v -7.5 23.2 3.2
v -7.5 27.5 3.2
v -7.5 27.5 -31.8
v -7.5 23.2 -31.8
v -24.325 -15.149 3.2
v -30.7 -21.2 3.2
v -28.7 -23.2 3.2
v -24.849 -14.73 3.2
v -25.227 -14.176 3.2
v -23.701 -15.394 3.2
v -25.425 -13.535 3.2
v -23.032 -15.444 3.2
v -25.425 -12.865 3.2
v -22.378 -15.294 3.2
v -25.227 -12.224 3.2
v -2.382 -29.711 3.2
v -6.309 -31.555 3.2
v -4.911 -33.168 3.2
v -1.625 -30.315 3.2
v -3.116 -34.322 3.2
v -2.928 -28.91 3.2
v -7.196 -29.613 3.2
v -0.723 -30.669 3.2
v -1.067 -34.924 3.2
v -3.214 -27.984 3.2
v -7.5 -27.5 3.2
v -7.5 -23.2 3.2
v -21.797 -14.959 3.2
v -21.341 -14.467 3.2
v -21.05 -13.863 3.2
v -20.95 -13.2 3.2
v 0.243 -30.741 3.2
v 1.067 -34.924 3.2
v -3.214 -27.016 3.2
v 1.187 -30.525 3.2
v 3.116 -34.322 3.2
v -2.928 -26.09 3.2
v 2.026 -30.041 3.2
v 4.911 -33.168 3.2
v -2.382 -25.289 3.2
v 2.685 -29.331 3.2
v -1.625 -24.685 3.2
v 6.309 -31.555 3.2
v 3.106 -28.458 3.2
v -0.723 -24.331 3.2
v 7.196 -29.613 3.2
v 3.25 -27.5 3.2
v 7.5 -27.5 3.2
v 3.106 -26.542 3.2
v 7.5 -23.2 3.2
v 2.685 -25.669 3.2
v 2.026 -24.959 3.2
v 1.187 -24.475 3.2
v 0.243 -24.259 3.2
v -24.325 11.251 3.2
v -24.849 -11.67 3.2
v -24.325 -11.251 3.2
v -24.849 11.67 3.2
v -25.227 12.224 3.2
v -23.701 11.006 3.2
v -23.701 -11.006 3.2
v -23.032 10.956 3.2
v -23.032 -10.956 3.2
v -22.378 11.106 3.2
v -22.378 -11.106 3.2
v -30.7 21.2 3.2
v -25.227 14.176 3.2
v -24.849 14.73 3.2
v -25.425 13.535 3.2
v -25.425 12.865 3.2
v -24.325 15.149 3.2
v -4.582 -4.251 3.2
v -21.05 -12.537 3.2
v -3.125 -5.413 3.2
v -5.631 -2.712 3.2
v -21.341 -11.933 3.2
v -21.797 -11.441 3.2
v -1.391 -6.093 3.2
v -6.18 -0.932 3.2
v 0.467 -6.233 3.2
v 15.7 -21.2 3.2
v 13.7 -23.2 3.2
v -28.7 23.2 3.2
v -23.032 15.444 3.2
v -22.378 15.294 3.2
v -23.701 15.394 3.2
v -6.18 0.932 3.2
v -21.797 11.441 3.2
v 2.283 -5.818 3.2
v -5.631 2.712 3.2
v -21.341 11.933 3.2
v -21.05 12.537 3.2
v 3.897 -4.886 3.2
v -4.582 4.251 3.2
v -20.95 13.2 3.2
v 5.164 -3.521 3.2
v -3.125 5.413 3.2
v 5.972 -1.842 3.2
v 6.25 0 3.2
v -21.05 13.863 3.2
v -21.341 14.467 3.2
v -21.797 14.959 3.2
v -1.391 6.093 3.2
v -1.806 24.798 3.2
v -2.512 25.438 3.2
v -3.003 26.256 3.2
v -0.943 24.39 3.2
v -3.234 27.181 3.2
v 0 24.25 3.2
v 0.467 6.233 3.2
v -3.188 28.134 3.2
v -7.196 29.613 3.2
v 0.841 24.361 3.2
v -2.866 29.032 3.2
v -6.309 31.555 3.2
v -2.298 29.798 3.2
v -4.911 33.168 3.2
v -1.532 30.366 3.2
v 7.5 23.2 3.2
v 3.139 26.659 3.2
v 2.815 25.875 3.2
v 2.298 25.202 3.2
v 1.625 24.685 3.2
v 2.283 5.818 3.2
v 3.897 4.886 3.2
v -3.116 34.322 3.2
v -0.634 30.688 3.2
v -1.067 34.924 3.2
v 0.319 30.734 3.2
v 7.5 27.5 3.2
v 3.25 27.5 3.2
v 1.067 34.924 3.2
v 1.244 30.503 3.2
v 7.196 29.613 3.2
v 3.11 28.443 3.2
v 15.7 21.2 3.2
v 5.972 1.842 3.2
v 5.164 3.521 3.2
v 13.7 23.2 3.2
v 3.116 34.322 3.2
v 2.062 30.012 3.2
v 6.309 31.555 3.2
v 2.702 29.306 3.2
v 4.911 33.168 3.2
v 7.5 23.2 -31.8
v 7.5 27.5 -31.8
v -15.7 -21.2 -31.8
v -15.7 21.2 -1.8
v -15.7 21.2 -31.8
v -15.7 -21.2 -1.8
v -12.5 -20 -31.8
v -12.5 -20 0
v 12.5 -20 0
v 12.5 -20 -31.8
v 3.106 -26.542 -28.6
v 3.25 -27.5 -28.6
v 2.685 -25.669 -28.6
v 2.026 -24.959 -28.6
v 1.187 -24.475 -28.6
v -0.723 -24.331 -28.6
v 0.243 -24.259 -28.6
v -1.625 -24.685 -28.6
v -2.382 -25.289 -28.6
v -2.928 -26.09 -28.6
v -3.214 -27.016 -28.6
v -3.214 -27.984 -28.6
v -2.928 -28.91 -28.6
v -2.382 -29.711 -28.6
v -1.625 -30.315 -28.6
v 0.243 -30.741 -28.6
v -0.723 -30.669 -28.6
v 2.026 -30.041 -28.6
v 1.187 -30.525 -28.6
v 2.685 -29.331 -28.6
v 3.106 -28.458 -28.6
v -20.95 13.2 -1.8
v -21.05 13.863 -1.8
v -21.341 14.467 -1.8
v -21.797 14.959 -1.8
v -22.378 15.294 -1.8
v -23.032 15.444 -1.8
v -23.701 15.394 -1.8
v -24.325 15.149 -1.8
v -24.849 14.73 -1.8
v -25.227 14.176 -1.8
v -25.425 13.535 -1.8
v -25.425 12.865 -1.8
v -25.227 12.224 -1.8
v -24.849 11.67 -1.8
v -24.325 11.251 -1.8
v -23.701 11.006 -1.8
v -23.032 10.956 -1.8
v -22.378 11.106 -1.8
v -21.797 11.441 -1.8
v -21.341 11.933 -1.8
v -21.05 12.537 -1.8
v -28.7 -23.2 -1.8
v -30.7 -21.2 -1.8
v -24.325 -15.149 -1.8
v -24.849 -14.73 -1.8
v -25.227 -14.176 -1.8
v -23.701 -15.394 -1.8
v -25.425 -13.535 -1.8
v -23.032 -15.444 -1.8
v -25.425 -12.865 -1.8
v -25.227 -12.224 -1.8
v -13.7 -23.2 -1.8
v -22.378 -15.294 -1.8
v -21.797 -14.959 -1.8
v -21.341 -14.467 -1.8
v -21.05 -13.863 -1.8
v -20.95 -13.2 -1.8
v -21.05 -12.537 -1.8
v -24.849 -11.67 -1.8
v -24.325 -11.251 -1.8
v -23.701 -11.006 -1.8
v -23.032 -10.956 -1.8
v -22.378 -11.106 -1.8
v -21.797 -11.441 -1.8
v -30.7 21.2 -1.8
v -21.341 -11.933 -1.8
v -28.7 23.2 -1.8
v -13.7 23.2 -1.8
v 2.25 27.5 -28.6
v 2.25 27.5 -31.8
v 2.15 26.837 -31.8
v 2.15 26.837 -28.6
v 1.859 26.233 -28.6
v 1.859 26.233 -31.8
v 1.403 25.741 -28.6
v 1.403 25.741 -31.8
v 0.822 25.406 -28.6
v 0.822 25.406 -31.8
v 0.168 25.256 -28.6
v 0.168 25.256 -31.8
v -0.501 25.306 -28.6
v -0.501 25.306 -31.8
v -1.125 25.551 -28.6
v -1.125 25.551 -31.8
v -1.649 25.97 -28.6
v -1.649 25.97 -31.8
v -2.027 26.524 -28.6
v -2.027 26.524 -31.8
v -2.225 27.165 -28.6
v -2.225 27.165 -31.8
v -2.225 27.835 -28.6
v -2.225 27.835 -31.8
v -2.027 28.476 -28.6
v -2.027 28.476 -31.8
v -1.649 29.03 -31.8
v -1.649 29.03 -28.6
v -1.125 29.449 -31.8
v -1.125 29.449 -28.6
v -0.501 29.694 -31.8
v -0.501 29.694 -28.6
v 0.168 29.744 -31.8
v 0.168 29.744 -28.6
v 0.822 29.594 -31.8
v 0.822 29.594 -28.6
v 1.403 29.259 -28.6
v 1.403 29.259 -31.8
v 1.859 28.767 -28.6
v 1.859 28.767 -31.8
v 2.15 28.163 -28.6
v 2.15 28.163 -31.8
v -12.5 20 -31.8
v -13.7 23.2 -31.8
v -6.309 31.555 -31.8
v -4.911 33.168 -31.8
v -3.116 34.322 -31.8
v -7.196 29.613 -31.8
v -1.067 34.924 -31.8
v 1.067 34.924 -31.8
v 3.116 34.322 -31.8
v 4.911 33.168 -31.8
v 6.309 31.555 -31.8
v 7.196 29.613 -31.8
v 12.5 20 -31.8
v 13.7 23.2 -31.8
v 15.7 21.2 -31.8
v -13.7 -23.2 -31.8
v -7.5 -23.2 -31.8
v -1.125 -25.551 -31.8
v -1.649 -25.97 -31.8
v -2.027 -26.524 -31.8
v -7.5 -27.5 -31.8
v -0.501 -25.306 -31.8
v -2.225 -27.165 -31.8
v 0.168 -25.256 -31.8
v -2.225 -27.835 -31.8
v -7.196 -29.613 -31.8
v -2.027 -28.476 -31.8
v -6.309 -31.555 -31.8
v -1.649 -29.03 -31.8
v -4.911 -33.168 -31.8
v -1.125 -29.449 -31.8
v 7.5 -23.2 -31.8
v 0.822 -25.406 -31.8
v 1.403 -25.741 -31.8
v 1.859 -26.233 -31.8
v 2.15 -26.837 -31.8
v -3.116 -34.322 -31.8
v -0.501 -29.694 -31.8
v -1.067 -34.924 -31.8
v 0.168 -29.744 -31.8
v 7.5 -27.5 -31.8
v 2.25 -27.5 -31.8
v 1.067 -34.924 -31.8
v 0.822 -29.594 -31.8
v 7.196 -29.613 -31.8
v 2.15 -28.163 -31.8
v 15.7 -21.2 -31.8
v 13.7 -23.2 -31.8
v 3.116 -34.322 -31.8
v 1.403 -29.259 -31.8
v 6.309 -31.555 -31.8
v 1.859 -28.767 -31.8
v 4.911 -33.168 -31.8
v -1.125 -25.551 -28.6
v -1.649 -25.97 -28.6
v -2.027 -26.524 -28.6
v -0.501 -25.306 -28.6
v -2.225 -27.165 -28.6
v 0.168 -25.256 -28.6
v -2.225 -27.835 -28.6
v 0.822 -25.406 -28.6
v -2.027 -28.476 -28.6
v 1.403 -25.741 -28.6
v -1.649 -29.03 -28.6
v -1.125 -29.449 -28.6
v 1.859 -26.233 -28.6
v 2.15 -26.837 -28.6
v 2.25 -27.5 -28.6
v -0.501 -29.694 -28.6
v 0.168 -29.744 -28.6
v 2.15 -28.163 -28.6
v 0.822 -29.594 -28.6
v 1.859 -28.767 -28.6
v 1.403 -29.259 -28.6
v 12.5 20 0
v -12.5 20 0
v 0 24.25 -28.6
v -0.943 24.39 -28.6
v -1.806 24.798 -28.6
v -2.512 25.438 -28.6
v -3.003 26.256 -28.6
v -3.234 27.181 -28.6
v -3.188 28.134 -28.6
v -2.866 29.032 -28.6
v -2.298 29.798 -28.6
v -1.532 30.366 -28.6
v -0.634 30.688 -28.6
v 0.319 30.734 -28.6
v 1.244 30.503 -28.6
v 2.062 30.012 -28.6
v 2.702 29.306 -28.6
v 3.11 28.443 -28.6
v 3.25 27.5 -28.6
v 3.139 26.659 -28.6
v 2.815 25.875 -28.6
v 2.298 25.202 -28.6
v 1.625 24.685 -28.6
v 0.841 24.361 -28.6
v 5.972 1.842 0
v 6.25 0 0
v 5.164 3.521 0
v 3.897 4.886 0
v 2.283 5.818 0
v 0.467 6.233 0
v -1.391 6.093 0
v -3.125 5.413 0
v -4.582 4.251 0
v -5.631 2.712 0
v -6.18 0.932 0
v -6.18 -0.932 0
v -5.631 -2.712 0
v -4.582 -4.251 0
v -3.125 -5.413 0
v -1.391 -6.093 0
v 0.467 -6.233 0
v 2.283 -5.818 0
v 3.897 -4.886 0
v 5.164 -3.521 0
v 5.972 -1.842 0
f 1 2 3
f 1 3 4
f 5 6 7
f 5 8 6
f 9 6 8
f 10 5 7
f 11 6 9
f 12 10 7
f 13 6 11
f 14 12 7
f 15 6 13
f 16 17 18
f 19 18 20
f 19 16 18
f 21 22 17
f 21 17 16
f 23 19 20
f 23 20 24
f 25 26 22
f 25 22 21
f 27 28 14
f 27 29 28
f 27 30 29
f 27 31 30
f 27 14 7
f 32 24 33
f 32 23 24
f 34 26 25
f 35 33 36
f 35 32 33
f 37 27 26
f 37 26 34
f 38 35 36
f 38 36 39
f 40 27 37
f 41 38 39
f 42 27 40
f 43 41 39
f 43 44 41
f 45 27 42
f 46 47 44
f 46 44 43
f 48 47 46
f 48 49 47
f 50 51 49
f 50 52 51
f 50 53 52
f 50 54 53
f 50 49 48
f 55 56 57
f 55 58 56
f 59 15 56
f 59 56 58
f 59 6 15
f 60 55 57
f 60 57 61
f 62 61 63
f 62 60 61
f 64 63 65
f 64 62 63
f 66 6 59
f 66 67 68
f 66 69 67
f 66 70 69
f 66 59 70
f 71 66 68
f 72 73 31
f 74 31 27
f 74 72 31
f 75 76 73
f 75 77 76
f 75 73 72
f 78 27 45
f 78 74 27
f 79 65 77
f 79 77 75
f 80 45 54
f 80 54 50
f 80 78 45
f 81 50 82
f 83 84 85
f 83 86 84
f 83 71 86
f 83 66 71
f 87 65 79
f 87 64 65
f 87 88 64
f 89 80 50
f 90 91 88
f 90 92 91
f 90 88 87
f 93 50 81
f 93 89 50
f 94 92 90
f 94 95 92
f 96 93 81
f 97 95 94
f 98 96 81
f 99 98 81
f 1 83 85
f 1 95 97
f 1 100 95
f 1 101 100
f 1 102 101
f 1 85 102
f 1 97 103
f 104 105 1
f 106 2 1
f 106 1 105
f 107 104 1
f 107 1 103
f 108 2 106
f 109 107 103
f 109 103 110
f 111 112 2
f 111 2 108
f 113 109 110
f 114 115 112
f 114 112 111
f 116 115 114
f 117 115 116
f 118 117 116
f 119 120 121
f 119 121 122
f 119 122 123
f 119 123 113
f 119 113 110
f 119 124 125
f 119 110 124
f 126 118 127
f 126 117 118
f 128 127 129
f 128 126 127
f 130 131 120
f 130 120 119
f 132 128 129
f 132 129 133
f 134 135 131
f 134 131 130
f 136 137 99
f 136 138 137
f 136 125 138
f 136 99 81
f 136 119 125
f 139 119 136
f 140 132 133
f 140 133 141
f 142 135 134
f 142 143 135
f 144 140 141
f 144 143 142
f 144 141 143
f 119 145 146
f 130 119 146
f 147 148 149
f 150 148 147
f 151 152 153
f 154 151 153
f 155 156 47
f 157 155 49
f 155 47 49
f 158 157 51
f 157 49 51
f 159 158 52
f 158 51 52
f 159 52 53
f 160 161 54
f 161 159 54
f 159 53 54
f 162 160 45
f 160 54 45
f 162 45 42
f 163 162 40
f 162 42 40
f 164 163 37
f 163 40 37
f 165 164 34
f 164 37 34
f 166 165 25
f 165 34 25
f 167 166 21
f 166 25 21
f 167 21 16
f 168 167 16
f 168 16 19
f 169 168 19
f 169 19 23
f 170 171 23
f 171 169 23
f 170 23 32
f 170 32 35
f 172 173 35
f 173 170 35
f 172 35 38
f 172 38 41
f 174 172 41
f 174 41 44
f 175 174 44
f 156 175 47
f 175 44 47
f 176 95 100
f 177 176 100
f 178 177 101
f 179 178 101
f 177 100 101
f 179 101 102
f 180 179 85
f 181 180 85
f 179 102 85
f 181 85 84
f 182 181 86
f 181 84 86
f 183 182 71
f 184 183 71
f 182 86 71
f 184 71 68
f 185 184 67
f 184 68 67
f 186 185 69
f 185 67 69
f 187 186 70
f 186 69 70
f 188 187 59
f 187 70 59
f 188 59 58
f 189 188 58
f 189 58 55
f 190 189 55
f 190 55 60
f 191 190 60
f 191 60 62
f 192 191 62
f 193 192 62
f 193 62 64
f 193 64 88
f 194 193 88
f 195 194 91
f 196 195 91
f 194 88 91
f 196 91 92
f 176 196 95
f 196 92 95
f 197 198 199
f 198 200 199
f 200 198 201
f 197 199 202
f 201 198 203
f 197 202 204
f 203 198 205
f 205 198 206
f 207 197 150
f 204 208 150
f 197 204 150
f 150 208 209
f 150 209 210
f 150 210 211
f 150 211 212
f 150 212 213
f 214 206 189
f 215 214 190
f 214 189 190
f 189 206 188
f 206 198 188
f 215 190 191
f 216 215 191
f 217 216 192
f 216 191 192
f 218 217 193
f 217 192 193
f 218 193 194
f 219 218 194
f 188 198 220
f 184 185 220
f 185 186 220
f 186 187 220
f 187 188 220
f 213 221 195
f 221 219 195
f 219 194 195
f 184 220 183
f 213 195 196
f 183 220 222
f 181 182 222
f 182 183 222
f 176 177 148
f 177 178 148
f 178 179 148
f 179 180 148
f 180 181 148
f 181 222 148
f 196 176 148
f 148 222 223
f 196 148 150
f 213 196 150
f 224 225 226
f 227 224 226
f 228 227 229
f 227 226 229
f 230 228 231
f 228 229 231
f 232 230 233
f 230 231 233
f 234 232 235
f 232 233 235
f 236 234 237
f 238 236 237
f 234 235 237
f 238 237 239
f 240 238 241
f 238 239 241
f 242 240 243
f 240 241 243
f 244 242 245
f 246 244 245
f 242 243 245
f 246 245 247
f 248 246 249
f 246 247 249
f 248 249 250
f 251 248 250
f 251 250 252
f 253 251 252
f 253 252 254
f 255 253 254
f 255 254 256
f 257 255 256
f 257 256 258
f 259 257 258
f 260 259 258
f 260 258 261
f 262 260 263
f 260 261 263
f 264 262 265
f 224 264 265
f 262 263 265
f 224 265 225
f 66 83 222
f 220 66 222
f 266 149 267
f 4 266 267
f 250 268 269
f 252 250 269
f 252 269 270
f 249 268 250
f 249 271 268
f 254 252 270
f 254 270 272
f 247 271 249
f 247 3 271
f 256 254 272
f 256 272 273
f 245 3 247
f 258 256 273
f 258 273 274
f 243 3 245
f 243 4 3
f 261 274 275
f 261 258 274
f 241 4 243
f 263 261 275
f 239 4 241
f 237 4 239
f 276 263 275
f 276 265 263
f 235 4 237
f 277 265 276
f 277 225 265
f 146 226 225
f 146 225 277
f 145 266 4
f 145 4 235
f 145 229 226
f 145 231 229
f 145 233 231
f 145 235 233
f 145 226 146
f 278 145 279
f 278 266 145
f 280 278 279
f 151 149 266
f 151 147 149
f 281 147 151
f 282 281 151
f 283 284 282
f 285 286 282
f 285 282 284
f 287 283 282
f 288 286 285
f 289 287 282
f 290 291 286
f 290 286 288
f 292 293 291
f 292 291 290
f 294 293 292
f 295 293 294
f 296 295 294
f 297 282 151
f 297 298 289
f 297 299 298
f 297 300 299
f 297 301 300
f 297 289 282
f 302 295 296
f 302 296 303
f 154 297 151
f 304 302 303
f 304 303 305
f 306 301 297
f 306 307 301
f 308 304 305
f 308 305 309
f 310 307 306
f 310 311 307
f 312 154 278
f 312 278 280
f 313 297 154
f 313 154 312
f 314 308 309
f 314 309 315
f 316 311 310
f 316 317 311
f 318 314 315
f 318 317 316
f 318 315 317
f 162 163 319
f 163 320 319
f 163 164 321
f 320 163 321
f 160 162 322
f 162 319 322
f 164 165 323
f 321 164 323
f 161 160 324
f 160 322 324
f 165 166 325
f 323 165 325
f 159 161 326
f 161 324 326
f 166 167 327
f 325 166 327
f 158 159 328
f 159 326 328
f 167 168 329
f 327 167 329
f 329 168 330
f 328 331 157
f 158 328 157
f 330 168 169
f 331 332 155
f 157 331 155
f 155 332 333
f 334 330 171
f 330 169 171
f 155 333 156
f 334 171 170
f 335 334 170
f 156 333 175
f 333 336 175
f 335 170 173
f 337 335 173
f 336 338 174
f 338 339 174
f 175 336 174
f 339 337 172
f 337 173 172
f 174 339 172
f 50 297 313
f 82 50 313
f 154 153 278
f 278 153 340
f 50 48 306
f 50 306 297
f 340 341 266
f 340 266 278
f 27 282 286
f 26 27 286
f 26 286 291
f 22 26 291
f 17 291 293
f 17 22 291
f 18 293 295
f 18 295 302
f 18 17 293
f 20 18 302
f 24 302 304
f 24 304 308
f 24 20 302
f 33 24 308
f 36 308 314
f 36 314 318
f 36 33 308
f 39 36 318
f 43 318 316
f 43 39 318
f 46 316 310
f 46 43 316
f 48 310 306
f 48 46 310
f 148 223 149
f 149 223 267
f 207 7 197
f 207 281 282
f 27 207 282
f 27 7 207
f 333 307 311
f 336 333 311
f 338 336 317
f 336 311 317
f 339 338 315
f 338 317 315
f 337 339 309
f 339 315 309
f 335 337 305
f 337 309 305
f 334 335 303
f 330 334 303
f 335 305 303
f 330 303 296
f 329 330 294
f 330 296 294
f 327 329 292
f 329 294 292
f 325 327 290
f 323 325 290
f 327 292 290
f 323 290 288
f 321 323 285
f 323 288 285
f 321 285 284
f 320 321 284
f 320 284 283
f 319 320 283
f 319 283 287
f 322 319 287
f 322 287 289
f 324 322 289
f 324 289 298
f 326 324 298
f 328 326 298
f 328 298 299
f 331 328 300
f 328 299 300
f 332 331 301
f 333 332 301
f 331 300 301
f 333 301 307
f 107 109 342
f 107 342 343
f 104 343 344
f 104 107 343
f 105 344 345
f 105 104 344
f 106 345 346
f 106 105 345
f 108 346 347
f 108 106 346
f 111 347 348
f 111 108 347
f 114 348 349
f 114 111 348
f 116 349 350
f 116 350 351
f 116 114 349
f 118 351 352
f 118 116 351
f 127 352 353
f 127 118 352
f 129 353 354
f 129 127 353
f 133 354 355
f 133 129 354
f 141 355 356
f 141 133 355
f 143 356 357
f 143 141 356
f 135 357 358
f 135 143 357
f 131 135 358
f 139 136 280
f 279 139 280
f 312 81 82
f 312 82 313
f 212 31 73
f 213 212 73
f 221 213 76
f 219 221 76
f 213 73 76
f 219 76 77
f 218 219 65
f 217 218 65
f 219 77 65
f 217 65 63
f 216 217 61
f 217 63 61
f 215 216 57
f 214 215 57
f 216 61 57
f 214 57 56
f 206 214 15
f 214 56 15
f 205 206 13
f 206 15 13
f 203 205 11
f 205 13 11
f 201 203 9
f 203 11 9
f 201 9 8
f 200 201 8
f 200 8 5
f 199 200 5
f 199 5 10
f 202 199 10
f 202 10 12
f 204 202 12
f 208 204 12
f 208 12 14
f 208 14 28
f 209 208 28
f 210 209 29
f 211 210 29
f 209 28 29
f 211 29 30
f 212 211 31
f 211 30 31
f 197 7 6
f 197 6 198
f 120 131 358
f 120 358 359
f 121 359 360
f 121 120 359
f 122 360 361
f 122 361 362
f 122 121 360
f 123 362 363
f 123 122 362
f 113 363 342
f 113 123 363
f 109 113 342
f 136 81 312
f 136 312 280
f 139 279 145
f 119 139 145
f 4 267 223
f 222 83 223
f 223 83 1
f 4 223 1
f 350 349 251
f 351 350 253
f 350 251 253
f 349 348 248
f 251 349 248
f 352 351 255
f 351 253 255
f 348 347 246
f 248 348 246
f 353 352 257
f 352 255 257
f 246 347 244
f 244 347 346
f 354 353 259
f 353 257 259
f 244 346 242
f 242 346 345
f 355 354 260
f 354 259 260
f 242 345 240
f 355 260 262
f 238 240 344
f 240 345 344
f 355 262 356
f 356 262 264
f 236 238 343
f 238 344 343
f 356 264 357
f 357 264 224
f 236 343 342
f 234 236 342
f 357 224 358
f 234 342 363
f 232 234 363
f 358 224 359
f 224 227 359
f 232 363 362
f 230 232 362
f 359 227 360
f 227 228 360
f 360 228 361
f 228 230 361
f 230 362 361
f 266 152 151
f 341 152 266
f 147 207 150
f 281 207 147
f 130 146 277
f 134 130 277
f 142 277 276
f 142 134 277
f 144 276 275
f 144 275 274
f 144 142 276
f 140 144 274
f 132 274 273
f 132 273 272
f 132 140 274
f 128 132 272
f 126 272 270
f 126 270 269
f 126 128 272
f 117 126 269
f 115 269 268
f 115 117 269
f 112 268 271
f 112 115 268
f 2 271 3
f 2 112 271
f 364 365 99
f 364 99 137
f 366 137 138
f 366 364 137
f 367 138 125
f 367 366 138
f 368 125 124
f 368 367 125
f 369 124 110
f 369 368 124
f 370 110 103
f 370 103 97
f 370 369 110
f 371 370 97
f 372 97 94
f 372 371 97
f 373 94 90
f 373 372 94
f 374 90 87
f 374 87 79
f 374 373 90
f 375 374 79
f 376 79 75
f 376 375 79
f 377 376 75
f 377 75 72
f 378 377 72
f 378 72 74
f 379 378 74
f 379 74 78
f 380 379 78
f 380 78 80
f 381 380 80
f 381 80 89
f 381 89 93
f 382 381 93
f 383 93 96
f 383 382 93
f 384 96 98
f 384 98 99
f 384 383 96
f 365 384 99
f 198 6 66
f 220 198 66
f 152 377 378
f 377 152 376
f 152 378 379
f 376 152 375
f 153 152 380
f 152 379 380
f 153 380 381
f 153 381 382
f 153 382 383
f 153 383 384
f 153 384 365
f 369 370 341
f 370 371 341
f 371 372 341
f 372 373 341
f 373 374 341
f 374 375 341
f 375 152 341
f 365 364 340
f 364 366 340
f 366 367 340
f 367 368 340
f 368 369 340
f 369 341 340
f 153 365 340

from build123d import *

# Parameters (mm, degrees)
F0_W     = 25
F0_H     = 40
F0_R     = 6.25
F1_DEPTH = 3.2
F2_R     = 3.25
F2_W     = 25
F2_H     = 40
F3_DEPTH = 35
F4_W     = 15
F4_H     = 46.4
F4_R     = 2.25
F5_DEPTH = 5
F6_SIZE  = 2
F7_R     = 3.25
F7_R_2   = 2.25
F8_DEPTH = 3.2


with BuildPart() as f1:
    # F0 (on Top) → F1 (new body)
    with BuildSketch(Plane.XY):
        Rectangle(F0_W, F0_H)
        Circle(F0_R, mode=Mode.SUBTRACT)
    extrude(amount=F1_DEPTH)

    # F2 (on face) → F3 (join)
    with BuildSketch(Plane.XY.offset(3.2)):
        with BuildLine():
            Line((15.7, -23.2), (15.7, 23.2))
            Line((15.7, 23.2), (7.5, 23.2))
            Line((7.5, 23.2), (7.5, 27.5))
            ThreePointArc((7.5, 27.5), (0, 35), (-7.5, 27.5))
            Line((-7.5, 27.5), (-7.5, 23.2))
            Line((-7.5, 23.2), (-15.7, 23.2))
            Line((-15.7, 23.2), (-15.7, -23.2))
            Line((-15.7, -23.2), (-7.5, -23.2))
            Line((-7.5, -23.2), (-7.5, -27.5))
            ThreePointArc((-7.5, -27.5), (0, -35), (7.5, -27.5))
            Line((7.5, -27.5), (7.5, -23.2))
            Line((7.5, -23.2), (15.7, -23.2))
        make_face()
        with Locations((0, -27.5)):
            Circle(F2_R, mode=Mode.SUBTRACT)
        Rectangle(F2_W, F2_H, mode=Mode.SUBTRACT)
        with BuildLine():
            ThreePointArc((0, 24.25), (-2.2980970389, 29.7980970389), (3.25, 27.5))
            ThreePointArc((3.25, 27.5), (2.2980970389, 25.2019029611), (0, 24.25))
        make_face(mode=Mode.SUBTRACT)
    extrude(amount=-F3_DEPTH)

    # F4 (on face) → F5 (join)
    with BuildSketch(Plane.XY.offset(3.2)):
        with Locations((-23.2, 0)):
            Rectangle(F4_W, F4_H)
        with Locations((-23.2, -13.2)):
            Circle(F4_R, mode=Mode.SUBTRACT)
        with Locations((-23.2, 13.2)):
            Circle(F4_R, mode=Mode.SUBTRACT)
    extrude(amount=-F5_DEPTH)

    # F6
    f6_edges = [f1.edges().sort_by_distance(p)[0] for p in [
        (15.7, 23.2, -14.3),
        (-15.7, 23.2, -16.8),
        (-15.7, -23.2, -16.8),
        (15.7, -23.2, -14.3),
        (-30.7, 23.2, 0.7),
        (-30.7, -23.2, 0.7),
    ]]
    chamfer(f6_edges, length=F6_SIZE)

    # F7 (on face) → F8 (join)
    with BuildSketch(Plane(origin=(0, 0, -31.8), x_dir=(1, 0, 0), z_dir=(0, 0, -1))):
        with Locations((0, -27.5)):
            Circle(F7_R)
        with Locations((0, -27.5)):
            Circle(F7_R_2, mode=Mode.SUBTRACT)
        with Locations((0, 27.5)):
            Circle(F7_R)
        with Locations((0, 27.5)):
            Circle(F7_R_2, mode=Mode.SUBTRACT)
    extrude(amount=-F8_DEPTH)


solid = f1.part
